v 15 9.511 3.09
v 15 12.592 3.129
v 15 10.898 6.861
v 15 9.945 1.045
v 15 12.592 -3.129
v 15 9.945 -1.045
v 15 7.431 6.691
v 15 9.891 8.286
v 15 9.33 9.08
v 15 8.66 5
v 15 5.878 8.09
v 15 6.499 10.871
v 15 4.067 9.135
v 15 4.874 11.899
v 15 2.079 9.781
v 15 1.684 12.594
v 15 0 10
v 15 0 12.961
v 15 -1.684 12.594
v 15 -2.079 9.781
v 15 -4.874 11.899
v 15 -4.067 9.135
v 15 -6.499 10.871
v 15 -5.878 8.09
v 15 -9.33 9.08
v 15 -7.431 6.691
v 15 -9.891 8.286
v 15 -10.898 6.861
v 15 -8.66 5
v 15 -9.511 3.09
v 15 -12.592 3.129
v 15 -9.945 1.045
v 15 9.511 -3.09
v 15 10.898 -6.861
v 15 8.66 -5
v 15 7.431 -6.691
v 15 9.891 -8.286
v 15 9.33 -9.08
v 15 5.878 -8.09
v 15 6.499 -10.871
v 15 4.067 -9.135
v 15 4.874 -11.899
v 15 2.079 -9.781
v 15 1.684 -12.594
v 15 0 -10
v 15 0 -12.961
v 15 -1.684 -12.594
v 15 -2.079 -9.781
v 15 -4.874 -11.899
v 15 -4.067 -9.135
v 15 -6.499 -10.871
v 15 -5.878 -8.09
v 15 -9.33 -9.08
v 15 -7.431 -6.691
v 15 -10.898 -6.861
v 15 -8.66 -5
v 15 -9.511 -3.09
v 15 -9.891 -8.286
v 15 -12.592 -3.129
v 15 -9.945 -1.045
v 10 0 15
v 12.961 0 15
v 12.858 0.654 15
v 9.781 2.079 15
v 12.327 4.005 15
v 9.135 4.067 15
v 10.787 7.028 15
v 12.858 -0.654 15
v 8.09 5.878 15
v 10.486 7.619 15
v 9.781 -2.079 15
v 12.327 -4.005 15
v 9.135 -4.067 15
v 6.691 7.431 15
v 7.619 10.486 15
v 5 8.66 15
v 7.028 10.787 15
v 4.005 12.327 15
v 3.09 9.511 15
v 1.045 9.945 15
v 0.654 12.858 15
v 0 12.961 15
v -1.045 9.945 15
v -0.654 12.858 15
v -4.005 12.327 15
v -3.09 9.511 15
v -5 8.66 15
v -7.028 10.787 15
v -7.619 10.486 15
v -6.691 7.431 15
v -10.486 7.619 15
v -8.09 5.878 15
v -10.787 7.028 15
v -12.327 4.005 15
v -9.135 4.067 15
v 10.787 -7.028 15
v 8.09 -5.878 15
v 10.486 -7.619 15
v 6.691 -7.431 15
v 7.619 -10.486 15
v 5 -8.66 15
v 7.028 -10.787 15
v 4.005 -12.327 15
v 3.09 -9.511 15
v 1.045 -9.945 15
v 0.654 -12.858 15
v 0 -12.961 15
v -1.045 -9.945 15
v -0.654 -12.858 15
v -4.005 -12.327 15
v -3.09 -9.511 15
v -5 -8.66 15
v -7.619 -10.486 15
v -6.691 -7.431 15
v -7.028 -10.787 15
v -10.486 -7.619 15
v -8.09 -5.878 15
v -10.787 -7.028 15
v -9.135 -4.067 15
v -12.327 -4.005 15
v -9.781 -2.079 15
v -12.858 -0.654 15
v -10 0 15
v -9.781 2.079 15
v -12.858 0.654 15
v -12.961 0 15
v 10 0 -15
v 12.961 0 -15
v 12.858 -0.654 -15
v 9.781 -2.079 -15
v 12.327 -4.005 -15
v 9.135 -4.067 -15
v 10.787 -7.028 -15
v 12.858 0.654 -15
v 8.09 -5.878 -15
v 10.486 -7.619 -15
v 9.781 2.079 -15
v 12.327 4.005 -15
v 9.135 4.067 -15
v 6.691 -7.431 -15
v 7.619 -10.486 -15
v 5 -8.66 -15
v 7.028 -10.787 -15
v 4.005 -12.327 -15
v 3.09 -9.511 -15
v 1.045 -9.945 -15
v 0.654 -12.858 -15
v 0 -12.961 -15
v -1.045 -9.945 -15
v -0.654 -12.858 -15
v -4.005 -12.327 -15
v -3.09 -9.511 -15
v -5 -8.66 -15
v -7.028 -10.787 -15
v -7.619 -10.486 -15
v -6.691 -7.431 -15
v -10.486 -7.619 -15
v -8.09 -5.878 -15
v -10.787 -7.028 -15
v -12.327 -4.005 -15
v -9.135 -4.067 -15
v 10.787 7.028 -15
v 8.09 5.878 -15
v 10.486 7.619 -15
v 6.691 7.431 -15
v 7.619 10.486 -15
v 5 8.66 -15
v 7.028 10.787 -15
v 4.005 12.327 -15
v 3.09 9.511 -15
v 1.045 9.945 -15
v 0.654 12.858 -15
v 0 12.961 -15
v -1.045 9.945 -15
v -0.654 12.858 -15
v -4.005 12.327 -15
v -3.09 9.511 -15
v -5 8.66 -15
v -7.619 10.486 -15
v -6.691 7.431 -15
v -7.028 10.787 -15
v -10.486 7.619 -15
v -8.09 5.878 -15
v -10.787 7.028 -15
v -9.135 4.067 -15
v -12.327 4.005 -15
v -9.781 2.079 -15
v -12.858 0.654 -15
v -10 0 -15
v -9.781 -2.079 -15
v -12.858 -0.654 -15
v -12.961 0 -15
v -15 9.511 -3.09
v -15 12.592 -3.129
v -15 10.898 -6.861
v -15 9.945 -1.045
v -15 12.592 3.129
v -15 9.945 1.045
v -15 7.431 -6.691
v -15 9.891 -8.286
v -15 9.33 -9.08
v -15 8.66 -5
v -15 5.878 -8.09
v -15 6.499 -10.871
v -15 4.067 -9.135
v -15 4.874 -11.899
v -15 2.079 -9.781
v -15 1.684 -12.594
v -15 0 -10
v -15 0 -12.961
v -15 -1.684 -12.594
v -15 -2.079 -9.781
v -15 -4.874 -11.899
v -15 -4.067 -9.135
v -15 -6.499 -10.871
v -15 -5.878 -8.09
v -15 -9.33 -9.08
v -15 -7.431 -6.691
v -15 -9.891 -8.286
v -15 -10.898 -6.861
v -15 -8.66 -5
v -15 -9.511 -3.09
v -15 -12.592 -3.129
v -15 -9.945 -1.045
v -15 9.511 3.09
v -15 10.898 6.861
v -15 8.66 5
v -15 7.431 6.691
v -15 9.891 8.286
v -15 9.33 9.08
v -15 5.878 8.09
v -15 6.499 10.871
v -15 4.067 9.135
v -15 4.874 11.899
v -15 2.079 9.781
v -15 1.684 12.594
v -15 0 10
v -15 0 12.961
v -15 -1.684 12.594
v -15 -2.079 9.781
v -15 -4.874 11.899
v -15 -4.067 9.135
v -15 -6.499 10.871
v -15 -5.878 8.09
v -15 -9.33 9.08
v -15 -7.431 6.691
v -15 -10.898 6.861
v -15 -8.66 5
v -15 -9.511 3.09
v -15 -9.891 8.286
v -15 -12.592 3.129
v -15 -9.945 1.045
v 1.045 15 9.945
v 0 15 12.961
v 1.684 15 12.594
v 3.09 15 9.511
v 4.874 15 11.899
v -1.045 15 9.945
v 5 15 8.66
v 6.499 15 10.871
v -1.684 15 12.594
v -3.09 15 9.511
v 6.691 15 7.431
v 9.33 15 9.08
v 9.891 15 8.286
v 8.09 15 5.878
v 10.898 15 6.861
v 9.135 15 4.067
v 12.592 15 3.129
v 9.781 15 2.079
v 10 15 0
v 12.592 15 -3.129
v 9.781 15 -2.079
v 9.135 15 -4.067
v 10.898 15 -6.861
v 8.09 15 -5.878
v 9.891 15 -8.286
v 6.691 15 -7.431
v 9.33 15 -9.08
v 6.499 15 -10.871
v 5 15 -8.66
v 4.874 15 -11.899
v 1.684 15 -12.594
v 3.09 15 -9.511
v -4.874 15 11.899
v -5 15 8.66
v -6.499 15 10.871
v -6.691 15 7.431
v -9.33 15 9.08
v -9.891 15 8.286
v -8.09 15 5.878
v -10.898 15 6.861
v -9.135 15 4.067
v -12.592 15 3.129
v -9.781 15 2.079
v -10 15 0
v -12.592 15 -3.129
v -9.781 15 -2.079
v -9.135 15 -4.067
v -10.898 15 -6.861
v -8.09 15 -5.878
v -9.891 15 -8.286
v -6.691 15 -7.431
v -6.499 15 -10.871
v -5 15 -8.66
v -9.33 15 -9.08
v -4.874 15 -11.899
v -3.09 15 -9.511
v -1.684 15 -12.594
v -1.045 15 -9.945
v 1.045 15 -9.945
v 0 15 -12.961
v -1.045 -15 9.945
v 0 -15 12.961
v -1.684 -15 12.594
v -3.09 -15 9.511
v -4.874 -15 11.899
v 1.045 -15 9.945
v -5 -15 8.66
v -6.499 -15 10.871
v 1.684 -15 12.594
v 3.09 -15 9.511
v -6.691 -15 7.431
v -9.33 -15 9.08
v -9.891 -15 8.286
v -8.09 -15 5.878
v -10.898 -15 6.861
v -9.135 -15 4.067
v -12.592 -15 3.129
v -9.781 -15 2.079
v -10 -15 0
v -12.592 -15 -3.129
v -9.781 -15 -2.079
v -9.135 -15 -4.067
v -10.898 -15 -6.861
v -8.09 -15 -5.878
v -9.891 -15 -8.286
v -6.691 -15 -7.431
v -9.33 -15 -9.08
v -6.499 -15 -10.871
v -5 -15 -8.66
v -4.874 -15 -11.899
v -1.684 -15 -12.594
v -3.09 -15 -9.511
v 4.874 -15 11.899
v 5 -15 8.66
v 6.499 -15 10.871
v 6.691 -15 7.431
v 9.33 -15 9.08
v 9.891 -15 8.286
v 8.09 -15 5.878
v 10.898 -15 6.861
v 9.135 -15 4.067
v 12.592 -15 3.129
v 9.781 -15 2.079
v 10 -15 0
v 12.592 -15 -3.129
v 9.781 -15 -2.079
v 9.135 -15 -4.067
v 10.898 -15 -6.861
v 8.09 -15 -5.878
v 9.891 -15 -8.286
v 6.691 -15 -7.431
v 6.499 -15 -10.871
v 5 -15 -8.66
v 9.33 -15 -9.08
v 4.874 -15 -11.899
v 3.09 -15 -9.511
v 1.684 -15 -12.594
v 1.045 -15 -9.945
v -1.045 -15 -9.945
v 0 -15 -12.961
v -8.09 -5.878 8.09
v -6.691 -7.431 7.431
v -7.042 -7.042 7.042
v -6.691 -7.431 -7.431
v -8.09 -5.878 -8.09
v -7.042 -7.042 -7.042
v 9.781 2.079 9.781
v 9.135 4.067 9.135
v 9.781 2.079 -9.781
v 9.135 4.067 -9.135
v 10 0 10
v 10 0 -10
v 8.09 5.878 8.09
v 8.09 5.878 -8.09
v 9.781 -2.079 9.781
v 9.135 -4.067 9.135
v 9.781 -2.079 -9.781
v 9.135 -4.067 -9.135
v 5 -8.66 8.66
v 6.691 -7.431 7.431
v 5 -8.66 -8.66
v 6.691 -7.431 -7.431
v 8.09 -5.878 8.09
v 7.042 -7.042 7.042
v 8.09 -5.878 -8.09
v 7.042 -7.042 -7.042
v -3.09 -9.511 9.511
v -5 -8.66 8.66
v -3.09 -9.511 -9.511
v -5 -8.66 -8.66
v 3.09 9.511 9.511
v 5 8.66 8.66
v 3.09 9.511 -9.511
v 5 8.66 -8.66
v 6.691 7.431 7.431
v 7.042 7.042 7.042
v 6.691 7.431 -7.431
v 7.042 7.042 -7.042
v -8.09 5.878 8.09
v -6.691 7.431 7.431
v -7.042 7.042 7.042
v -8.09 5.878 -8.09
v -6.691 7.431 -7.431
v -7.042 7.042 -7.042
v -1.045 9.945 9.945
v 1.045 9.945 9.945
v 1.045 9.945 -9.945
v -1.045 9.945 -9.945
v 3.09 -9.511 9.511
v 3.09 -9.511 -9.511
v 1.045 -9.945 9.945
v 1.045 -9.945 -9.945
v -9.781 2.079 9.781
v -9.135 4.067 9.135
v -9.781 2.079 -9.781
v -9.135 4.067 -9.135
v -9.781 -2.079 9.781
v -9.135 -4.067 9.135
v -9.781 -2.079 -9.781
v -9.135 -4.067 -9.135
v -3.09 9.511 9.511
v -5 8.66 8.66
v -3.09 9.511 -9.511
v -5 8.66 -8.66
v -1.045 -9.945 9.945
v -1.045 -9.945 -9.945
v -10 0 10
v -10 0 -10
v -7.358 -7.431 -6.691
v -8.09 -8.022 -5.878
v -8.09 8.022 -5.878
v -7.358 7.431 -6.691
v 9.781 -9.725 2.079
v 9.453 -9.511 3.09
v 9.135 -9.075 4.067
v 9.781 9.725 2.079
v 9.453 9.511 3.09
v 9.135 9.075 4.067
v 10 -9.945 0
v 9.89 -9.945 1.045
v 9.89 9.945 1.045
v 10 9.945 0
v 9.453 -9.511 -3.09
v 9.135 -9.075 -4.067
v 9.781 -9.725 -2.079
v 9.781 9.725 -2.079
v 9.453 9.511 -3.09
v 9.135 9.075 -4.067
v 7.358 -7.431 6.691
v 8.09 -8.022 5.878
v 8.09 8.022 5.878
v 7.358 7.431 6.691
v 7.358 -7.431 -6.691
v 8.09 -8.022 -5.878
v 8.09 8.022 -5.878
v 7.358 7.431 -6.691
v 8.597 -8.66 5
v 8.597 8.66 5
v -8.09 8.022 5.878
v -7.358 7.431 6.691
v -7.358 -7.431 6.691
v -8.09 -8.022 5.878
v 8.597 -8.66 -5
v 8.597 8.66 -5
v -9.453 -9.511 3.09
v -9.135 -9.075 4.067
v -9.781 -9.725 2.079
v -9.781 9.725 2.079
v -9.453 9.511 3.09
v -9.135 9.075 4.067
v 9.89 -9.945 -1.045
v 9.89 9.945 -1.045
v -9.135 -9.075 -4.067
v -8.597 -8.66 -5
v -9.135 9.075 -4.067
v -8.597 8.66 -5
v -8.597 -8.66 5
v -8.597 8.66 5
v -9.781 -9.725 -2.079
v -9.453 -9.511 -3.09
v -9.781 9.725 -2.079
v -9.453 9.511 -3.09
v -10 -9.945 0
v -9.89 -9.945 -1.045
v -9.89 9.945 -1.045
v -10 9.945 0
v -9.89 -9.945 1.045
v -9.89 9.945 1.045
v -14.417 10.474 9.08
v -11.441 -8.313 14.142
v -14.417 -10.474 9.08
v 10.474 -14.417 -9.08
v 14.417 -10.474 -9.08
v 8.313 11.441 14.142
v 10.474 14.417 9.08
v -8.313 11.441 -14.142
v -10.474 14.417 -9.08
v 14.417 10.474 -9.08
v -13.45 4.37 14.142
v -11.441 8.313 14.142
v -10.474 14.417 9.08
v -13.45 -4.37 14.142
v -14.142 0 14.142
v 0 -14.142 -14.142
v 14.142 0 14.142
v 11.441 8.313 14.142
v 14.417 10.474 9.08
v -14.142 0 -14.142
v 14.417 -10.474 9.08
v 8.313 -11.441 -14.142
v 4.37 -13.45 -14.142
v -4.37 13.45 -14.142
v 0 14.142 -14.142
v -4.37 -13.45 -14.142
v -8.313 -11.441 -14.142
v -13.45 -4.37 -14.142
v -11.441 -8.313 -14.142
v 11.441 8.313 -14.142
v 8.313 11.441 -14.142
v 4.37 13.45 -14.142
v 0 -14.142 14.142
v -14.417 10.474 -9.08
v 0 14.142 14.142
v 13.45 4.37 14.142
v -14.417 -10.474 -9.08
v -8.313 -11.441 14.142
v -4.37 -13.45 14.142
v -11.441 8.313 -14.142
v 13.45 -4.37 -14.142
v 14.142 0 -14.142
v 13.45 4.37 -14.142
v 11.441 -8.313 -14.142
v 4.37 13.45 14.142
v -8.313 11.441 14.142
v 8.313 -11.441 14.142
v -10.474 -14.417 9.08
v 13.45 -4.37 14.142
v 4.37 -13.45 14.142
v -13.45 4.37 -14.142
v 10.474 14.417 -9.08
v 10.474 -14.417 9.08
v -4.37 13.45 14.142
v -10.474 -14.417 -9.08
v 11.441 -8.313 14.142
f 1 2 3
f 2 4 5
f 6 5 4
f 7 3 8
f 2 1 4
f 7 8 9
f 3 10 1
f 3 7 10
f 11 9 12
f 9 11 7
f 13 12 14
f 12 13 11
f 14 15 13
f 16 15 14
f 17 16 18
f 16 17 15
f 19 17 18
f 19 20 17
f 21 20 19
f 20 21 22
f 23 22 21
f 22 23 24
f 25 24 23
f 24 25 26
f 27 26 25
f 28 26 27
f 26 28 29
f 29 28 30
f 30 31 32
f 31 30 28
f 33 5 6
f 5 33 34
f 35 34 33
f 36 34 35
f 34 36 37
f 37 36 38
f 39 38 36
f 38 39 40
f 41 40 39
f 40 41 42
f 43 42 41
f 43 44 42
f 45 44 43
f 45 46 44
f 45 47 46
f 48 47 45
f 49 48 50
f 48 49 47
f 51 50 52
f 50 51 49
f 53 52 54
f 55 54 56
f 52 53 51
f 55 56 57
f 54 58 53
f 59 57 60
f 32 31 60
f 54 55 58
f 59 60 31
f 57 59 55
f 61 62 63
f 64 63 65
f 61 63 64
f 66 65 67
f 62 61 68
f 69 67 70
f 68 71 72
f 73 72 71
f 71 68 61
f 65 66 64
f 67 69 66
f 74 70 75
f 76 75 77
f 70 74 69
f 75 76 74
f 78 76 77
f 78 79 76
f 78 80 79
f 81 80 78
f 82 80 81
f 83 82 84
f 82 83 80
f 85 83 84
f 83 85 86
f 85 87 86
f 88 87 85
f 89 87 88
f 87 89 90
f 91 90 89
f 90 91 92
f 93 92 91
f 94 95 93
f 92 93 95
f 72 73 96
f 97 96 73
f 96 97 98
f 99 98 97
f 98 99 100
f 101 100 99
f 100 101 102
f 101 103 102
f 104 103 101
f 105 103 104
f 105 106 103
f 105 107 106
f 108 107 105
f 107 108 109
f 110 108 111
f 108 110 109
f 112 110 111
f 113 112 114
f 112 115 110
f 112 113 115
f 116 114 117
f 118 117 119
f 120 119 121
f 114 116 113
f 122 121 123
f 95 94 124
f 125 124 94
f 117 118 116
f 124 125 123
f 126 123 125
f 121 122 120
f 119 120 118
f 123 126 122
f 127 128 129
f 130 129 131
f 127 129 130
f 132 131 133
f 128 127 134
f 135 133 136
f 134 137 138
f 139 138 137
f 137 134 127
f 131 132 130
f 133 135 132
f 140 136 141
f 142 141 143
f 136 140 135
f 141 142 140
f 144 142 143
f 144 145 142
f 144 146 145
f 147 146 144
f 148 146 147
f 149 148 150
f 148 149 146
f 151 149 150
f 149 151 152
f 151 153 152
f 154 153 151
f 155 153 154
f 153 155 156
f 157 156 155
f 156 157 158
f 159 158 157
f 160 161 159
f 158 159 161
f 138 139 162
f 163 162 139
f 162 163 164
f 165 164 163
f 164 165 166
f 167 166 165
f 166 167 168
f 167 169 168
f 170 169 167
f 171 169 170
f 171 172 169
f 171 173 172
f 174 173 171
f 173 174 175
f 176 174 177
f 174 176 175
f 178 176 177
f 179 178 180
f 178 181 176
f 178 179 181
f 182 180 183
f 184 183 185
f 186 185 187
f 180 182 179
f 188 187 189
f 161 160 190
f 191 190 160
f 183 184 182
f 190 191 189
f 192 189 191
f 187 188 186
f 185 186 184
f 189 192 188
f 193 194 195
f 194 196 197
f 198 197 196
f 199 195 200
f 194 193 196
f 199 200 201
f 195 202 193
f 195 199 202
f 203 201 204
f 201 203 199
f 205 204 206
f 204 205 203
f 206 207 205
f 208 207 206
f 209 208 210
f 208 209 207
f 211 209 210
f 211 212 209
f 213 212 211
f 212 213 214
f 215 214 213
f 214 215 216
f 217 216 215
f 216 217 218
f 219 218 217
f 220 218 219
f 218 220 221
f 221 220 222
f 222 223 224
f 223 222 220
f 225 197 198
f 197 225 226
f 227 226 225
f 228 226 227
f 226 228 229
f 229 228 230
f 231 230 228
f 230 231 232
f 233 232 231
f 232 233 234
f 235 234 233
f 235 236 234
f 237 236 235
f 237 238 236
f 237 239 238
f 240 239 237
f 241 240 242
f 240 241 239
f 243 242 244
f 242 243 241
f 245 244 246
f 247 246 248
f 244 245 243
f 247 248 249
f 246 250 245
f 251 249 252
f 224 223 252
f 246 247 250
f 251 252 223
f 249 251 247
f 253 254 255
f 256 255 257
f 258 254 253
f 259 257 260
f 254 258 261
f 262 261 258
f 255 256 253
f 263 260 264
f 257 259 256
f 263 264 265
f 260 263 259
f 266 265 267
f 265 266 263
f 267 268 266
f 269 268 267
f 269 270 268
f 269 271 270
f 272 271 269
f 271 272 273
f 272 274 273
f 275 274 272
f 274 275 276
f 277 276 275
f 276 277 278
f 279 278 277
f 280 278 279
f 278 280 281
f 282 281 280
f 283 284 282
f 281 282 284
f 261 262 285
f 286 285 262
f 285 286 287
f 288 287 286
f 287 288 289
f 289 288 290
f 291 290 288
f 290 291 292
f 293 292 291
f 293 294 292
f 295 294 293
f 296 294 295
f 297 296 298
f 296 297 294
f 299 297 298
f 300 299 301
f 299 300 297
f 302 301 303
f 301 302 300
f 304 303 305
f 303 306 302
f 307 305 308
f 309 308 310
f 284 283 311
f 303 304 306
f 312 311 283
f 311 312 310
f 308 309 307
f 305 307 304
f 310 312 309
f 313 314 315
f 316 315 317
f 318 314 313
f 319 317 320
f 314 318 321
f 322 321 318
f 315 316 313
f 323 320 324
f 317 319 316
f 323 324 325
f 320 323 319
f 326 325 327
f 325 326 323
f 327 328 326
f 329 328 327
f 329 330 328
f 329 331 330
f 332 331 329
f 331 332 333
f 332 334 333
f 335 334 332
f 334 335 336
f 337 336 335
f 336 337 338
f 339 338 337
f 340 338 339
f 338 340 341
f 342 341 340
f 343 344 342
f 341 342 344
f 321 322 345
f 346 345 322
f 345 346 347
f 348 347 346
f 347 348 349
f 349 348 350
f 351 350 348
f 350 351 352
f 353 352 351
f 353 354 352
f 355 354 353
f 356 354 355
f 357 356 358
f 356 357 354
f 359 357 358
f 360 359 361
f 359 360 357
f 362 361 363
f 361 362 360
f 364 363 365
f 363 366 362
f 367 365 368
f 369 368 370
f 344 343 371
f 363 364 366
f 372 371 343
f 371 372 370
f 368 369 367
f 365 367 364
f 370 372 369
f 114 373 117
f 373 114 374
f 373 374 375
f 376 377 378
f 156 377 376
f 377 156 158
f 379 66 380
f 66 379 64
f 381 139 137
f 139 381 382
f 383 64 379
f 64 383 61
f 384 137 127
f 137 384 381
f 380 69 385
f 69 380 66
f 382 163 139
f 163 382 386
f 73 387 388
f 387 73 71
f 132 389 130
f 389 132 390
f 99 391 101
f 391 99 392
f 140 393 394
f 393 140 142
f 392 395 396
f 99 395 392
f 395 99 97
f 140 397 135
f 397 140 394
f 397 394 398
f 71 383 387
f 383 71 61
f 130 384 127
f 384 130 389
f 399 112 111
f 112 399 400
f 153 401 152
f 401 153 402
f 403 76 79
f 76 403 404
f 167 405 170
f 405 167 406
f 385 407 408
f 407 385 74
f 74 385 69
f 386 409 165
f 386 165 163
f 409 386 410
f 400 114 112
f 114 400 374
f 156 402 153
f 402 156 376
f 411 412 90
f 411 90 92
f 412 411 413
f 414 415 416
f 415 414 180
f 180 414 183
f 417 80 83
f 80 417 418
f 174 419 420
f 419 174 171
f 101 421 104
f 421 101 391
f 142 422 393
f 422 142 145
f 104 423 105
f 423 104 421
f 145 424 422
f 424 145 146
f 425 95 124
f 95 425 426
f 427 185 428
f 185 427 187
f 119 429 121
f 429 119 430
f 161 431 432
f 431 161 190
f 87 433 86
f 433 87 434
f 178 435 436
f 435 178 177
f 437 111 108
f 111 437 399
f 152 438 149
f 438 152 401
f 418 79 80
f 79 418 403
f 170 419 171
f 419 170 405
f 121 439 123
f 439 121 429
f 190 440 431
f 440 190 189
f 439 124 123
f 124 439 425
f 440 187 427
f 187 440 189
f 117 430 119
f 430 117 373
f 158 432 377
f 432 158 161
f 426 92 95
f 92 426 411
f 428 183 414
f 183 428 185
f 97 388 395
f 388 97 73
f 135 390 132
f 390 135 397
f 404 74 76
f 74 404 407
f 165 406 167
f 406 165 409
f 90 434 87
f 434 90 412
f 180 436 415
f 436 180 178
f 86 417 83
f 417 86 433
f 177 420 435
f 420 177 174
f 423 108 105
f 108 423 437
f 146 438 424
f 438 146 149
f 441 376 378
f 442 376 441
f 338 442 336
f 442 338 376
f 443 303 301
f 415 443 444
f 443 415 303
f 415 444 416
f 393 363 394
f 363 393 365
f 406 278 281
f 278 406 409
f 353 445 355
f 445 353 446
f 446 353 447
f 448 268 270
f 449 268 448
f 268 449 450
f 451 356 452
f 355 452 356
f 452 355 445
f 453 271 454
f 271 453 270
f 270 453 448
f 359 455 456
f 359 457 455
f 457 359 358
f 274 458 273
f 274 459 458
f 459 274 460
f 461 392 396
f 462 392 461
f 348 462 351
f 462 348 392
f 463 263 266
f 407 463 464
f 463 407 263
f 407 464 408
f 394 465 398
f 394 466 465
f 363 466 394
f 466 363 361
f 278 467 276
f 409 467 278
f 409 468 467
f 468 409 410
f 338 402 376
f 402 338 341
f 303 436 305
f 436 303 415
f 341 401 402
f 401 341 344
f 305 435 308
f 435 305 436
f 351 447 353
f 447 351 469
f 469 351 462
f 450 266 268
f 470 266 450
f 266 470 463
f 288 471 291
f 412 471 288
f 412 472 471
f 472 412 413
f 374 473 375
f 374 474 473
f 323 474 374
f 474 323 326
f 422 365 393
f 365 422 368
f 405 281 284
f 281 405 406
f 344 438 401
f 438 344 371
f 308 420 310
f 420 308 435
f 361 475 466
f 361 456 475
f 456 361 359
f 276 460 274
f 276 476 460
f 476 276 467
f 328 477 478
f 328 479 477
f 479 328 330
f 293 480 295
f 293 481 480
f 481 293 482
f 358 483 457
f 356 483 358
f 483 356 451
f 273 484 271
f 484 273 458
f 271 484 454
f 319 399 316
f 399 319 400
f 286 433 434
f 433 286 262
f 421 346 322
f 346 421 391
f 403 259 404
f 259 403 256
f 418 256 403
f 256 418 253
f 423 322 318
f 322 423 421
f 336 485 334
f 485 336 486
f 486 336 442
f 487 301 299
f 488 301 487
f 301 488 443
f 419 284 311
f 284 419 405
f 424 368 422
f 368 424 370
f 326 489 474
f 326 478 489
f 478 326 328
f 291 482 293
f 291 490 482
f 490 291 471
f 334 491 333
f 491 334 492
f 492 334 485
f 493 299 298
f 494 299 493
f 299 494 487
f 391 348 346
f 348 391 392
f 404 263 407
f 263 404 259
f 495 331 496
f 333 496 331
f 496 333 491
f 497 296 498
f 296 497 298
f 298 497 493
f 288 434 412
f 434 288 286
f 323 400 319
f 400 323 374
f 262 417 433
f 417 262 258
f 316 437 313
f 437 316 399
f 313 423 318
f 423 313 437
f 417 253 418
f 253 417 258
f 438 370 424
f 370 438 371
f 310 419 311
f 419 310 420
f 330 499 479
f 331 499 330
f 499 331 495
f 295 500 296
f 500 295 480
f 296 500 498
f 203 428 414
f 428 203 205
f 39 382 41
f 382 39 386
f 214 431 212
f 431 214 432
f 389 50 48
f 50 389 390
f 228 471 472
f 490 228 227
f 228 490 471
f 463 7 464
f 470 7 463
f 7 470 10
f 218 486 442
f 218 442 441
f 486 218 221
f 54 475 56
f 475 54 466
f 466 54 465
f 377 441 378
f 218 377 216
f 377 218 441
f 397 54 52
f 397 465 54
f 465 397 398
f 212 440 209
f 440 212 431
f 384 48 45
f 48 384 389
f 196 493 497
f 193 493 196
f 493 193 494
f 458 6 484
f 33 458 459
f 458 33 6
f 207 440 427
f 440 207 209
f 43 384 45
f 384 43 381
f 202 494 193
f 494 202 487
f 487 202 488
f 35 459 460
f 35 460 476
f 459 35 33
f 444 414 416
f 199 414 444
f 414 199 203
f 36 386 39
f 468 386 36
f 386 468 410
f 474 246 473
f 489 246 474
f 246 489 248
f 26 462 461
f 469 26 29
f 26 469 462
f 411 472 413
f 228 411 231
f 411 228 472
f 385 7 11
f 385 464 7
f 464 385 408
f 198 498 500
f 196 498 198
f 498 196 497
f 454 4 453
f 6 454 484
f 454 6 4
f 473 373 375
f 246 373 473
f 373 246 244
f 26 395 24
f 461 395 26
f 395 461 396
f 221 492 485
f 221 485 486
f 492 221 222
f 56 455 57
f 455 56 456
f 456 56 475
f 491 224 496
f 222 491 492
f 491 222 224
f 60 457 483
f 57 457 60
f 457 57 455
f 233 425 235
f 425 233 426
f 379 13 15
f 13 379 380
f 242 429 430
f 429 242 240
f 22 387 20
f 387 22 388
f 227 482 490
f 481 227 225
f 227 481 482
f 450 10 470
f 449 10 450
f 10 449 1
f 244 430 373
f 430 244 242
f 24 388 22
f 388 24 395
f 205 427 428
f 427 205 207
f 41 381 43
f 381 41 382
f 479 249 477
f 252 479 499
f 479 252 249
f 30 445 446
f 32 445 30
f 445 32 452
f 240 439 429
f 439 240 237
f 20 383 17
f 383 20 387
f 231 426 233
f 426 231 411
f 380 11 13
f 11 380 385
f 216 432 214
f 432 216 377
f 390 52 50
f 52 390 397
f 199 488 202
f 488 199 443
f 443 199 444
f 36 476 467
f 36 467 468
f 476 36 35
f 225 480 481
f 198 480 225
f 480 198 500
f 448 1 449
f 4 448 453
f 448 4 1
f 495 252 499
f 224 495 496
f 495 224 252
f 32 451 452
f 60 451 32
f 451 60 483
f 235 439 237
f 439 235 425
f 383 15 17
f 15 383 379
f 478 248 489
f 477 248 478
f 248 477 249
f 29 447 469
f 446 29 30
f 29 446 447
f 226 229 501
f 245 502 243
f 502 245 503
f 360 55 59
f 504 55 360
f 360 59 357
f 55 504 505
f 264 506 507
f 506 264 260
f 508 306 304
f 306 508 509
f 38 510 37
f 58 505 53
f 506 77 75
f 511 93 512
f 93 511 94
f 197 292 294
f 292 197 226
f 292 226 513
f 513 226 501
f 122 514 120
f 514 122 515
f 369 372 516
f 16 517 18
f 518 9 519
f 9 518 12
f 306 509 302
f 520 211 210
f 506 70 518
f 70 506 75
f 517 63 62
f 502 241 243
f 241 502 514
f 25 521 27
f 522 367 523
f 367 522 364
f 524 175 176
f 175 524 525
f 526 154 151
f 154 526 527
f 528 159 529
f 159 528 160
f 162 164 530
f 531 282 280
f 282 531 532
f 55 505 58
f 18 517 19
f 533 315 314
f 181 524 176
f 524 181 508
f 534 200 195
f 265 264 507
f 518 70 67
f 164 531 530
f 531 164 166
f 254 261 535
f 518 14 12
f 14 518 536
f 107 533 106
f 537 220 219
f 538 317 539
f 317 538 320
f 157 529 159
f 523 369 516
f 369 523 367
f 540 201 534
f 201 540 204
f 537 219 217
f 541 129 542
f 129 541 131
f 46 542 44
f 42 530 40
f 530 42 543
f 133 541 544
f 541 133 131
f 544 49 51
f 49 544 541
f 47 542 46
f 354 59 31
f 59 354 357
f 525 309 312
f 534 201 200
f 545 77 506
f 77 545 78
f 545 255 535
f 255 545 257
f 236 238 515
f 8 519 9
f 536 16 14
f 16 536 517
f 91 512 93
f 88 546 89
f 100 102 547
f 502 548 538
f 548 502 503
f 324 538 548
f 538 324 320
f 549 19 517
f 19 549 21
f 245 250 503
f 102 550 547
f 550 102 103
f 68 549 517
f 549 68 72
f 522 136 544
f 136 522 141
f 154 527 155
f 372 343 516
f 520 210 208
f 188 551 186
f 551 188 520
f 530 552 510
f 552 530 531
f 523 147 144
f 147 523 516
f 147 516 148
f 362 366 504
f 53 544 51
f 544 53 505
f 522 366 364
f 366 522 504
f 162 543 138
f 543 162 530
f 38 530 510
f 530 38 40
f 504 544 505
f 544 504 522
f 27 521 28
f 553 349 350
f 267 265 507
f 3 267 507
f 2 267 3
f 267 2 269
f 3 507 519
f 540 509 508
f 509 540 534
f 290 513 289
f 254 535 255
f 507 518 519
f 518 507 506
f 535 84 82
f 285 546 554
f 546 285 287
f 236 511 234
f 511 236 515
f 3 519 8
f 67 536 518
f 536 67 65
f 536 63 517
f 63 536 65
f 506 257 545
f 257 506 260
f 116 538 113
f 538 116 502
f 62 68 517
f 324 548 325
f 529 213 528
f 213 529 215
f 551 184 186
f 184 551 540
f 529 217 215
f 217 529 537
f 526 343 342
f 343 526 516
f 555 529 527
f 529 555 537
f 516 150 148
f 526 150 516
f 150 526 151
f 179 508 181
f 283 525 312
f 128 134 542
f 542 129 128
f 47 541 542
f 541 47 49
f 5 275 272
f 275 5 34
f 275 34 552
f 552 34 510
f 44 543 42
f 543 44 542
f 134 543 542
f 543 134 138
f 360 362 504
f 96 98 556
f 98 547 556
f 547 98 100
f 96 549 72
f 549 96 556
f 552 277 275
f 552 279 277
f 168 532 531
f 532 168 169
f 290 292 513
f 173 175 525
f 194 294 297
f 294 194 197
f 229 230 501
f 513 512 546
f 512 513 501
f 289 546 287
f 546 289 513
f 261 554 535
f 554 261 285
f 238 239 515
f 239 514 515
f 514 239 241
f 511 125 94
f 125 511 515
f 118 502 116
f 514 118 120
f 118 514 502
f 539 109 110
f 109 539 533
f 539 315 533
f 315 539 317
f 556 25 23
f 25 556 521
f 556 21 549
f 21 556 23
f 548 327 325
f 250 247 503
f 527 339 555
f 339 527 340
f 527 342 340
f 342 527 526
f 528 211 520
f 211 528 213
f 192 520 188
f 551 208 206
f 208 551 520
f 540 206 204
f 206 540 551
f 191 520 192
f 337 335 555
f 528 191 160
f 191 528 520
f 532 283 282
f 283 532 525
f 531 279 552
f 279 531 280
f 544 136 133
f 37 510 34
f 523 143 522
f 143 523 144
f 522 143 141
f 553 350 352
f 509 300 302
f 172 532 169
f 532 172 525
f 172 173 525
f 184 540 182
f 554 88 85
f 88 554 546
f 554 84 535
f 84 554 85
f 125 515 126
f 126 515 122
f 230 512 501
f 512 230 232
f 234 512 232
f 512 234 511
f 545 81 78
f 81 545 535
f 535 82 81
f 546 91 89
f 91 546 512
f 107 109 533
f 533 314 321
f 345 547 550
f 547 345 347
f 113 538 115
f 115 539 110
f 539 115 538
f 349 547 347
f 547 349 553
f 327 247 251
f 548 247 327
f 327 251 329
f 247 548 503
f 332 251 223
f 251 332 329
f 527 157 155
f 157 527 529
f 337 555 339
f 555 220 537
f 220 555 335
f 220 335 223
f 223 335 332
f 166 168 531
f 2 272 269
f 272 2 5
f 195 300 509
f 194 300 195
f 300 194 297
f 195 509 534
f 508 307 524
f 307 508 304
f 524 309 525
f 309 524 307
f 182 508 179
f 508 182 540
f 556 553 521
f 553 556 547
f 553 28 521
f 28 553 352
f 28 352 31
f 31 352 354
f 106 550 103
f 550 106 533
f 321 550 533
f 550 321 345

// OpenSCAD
//2d
module 2d(){
    module pacman(){
        r=5;
        difference(){
        circle(r,$fn=30);    
        
        translate([r,0])
        mirror([1,0,0]) 
        circle(r/1.5,$fn=3);
        }
    }

    n=5;
    for(i=[0:n-1])
    rotate(360/n*i)
    translate([10,0])pacman();
}

module 3d(){
    cyl_r=10;
    sphere_r=20;
    intersection(){
        difference(){
            cube(30,center=true);
            
            cylinder(r=cyl_r,h=100,center=true);
            
            rotate([1,0,0]*90)
            cylinder(r=cyl_r,h=100,center=true);
            
            rotate([0,1,0]*90)
            cylinder(r=cyl_r,h=100,center=true);
            
            }
            sphere(sphere_r,$fn=20);
    }


}
3d();
